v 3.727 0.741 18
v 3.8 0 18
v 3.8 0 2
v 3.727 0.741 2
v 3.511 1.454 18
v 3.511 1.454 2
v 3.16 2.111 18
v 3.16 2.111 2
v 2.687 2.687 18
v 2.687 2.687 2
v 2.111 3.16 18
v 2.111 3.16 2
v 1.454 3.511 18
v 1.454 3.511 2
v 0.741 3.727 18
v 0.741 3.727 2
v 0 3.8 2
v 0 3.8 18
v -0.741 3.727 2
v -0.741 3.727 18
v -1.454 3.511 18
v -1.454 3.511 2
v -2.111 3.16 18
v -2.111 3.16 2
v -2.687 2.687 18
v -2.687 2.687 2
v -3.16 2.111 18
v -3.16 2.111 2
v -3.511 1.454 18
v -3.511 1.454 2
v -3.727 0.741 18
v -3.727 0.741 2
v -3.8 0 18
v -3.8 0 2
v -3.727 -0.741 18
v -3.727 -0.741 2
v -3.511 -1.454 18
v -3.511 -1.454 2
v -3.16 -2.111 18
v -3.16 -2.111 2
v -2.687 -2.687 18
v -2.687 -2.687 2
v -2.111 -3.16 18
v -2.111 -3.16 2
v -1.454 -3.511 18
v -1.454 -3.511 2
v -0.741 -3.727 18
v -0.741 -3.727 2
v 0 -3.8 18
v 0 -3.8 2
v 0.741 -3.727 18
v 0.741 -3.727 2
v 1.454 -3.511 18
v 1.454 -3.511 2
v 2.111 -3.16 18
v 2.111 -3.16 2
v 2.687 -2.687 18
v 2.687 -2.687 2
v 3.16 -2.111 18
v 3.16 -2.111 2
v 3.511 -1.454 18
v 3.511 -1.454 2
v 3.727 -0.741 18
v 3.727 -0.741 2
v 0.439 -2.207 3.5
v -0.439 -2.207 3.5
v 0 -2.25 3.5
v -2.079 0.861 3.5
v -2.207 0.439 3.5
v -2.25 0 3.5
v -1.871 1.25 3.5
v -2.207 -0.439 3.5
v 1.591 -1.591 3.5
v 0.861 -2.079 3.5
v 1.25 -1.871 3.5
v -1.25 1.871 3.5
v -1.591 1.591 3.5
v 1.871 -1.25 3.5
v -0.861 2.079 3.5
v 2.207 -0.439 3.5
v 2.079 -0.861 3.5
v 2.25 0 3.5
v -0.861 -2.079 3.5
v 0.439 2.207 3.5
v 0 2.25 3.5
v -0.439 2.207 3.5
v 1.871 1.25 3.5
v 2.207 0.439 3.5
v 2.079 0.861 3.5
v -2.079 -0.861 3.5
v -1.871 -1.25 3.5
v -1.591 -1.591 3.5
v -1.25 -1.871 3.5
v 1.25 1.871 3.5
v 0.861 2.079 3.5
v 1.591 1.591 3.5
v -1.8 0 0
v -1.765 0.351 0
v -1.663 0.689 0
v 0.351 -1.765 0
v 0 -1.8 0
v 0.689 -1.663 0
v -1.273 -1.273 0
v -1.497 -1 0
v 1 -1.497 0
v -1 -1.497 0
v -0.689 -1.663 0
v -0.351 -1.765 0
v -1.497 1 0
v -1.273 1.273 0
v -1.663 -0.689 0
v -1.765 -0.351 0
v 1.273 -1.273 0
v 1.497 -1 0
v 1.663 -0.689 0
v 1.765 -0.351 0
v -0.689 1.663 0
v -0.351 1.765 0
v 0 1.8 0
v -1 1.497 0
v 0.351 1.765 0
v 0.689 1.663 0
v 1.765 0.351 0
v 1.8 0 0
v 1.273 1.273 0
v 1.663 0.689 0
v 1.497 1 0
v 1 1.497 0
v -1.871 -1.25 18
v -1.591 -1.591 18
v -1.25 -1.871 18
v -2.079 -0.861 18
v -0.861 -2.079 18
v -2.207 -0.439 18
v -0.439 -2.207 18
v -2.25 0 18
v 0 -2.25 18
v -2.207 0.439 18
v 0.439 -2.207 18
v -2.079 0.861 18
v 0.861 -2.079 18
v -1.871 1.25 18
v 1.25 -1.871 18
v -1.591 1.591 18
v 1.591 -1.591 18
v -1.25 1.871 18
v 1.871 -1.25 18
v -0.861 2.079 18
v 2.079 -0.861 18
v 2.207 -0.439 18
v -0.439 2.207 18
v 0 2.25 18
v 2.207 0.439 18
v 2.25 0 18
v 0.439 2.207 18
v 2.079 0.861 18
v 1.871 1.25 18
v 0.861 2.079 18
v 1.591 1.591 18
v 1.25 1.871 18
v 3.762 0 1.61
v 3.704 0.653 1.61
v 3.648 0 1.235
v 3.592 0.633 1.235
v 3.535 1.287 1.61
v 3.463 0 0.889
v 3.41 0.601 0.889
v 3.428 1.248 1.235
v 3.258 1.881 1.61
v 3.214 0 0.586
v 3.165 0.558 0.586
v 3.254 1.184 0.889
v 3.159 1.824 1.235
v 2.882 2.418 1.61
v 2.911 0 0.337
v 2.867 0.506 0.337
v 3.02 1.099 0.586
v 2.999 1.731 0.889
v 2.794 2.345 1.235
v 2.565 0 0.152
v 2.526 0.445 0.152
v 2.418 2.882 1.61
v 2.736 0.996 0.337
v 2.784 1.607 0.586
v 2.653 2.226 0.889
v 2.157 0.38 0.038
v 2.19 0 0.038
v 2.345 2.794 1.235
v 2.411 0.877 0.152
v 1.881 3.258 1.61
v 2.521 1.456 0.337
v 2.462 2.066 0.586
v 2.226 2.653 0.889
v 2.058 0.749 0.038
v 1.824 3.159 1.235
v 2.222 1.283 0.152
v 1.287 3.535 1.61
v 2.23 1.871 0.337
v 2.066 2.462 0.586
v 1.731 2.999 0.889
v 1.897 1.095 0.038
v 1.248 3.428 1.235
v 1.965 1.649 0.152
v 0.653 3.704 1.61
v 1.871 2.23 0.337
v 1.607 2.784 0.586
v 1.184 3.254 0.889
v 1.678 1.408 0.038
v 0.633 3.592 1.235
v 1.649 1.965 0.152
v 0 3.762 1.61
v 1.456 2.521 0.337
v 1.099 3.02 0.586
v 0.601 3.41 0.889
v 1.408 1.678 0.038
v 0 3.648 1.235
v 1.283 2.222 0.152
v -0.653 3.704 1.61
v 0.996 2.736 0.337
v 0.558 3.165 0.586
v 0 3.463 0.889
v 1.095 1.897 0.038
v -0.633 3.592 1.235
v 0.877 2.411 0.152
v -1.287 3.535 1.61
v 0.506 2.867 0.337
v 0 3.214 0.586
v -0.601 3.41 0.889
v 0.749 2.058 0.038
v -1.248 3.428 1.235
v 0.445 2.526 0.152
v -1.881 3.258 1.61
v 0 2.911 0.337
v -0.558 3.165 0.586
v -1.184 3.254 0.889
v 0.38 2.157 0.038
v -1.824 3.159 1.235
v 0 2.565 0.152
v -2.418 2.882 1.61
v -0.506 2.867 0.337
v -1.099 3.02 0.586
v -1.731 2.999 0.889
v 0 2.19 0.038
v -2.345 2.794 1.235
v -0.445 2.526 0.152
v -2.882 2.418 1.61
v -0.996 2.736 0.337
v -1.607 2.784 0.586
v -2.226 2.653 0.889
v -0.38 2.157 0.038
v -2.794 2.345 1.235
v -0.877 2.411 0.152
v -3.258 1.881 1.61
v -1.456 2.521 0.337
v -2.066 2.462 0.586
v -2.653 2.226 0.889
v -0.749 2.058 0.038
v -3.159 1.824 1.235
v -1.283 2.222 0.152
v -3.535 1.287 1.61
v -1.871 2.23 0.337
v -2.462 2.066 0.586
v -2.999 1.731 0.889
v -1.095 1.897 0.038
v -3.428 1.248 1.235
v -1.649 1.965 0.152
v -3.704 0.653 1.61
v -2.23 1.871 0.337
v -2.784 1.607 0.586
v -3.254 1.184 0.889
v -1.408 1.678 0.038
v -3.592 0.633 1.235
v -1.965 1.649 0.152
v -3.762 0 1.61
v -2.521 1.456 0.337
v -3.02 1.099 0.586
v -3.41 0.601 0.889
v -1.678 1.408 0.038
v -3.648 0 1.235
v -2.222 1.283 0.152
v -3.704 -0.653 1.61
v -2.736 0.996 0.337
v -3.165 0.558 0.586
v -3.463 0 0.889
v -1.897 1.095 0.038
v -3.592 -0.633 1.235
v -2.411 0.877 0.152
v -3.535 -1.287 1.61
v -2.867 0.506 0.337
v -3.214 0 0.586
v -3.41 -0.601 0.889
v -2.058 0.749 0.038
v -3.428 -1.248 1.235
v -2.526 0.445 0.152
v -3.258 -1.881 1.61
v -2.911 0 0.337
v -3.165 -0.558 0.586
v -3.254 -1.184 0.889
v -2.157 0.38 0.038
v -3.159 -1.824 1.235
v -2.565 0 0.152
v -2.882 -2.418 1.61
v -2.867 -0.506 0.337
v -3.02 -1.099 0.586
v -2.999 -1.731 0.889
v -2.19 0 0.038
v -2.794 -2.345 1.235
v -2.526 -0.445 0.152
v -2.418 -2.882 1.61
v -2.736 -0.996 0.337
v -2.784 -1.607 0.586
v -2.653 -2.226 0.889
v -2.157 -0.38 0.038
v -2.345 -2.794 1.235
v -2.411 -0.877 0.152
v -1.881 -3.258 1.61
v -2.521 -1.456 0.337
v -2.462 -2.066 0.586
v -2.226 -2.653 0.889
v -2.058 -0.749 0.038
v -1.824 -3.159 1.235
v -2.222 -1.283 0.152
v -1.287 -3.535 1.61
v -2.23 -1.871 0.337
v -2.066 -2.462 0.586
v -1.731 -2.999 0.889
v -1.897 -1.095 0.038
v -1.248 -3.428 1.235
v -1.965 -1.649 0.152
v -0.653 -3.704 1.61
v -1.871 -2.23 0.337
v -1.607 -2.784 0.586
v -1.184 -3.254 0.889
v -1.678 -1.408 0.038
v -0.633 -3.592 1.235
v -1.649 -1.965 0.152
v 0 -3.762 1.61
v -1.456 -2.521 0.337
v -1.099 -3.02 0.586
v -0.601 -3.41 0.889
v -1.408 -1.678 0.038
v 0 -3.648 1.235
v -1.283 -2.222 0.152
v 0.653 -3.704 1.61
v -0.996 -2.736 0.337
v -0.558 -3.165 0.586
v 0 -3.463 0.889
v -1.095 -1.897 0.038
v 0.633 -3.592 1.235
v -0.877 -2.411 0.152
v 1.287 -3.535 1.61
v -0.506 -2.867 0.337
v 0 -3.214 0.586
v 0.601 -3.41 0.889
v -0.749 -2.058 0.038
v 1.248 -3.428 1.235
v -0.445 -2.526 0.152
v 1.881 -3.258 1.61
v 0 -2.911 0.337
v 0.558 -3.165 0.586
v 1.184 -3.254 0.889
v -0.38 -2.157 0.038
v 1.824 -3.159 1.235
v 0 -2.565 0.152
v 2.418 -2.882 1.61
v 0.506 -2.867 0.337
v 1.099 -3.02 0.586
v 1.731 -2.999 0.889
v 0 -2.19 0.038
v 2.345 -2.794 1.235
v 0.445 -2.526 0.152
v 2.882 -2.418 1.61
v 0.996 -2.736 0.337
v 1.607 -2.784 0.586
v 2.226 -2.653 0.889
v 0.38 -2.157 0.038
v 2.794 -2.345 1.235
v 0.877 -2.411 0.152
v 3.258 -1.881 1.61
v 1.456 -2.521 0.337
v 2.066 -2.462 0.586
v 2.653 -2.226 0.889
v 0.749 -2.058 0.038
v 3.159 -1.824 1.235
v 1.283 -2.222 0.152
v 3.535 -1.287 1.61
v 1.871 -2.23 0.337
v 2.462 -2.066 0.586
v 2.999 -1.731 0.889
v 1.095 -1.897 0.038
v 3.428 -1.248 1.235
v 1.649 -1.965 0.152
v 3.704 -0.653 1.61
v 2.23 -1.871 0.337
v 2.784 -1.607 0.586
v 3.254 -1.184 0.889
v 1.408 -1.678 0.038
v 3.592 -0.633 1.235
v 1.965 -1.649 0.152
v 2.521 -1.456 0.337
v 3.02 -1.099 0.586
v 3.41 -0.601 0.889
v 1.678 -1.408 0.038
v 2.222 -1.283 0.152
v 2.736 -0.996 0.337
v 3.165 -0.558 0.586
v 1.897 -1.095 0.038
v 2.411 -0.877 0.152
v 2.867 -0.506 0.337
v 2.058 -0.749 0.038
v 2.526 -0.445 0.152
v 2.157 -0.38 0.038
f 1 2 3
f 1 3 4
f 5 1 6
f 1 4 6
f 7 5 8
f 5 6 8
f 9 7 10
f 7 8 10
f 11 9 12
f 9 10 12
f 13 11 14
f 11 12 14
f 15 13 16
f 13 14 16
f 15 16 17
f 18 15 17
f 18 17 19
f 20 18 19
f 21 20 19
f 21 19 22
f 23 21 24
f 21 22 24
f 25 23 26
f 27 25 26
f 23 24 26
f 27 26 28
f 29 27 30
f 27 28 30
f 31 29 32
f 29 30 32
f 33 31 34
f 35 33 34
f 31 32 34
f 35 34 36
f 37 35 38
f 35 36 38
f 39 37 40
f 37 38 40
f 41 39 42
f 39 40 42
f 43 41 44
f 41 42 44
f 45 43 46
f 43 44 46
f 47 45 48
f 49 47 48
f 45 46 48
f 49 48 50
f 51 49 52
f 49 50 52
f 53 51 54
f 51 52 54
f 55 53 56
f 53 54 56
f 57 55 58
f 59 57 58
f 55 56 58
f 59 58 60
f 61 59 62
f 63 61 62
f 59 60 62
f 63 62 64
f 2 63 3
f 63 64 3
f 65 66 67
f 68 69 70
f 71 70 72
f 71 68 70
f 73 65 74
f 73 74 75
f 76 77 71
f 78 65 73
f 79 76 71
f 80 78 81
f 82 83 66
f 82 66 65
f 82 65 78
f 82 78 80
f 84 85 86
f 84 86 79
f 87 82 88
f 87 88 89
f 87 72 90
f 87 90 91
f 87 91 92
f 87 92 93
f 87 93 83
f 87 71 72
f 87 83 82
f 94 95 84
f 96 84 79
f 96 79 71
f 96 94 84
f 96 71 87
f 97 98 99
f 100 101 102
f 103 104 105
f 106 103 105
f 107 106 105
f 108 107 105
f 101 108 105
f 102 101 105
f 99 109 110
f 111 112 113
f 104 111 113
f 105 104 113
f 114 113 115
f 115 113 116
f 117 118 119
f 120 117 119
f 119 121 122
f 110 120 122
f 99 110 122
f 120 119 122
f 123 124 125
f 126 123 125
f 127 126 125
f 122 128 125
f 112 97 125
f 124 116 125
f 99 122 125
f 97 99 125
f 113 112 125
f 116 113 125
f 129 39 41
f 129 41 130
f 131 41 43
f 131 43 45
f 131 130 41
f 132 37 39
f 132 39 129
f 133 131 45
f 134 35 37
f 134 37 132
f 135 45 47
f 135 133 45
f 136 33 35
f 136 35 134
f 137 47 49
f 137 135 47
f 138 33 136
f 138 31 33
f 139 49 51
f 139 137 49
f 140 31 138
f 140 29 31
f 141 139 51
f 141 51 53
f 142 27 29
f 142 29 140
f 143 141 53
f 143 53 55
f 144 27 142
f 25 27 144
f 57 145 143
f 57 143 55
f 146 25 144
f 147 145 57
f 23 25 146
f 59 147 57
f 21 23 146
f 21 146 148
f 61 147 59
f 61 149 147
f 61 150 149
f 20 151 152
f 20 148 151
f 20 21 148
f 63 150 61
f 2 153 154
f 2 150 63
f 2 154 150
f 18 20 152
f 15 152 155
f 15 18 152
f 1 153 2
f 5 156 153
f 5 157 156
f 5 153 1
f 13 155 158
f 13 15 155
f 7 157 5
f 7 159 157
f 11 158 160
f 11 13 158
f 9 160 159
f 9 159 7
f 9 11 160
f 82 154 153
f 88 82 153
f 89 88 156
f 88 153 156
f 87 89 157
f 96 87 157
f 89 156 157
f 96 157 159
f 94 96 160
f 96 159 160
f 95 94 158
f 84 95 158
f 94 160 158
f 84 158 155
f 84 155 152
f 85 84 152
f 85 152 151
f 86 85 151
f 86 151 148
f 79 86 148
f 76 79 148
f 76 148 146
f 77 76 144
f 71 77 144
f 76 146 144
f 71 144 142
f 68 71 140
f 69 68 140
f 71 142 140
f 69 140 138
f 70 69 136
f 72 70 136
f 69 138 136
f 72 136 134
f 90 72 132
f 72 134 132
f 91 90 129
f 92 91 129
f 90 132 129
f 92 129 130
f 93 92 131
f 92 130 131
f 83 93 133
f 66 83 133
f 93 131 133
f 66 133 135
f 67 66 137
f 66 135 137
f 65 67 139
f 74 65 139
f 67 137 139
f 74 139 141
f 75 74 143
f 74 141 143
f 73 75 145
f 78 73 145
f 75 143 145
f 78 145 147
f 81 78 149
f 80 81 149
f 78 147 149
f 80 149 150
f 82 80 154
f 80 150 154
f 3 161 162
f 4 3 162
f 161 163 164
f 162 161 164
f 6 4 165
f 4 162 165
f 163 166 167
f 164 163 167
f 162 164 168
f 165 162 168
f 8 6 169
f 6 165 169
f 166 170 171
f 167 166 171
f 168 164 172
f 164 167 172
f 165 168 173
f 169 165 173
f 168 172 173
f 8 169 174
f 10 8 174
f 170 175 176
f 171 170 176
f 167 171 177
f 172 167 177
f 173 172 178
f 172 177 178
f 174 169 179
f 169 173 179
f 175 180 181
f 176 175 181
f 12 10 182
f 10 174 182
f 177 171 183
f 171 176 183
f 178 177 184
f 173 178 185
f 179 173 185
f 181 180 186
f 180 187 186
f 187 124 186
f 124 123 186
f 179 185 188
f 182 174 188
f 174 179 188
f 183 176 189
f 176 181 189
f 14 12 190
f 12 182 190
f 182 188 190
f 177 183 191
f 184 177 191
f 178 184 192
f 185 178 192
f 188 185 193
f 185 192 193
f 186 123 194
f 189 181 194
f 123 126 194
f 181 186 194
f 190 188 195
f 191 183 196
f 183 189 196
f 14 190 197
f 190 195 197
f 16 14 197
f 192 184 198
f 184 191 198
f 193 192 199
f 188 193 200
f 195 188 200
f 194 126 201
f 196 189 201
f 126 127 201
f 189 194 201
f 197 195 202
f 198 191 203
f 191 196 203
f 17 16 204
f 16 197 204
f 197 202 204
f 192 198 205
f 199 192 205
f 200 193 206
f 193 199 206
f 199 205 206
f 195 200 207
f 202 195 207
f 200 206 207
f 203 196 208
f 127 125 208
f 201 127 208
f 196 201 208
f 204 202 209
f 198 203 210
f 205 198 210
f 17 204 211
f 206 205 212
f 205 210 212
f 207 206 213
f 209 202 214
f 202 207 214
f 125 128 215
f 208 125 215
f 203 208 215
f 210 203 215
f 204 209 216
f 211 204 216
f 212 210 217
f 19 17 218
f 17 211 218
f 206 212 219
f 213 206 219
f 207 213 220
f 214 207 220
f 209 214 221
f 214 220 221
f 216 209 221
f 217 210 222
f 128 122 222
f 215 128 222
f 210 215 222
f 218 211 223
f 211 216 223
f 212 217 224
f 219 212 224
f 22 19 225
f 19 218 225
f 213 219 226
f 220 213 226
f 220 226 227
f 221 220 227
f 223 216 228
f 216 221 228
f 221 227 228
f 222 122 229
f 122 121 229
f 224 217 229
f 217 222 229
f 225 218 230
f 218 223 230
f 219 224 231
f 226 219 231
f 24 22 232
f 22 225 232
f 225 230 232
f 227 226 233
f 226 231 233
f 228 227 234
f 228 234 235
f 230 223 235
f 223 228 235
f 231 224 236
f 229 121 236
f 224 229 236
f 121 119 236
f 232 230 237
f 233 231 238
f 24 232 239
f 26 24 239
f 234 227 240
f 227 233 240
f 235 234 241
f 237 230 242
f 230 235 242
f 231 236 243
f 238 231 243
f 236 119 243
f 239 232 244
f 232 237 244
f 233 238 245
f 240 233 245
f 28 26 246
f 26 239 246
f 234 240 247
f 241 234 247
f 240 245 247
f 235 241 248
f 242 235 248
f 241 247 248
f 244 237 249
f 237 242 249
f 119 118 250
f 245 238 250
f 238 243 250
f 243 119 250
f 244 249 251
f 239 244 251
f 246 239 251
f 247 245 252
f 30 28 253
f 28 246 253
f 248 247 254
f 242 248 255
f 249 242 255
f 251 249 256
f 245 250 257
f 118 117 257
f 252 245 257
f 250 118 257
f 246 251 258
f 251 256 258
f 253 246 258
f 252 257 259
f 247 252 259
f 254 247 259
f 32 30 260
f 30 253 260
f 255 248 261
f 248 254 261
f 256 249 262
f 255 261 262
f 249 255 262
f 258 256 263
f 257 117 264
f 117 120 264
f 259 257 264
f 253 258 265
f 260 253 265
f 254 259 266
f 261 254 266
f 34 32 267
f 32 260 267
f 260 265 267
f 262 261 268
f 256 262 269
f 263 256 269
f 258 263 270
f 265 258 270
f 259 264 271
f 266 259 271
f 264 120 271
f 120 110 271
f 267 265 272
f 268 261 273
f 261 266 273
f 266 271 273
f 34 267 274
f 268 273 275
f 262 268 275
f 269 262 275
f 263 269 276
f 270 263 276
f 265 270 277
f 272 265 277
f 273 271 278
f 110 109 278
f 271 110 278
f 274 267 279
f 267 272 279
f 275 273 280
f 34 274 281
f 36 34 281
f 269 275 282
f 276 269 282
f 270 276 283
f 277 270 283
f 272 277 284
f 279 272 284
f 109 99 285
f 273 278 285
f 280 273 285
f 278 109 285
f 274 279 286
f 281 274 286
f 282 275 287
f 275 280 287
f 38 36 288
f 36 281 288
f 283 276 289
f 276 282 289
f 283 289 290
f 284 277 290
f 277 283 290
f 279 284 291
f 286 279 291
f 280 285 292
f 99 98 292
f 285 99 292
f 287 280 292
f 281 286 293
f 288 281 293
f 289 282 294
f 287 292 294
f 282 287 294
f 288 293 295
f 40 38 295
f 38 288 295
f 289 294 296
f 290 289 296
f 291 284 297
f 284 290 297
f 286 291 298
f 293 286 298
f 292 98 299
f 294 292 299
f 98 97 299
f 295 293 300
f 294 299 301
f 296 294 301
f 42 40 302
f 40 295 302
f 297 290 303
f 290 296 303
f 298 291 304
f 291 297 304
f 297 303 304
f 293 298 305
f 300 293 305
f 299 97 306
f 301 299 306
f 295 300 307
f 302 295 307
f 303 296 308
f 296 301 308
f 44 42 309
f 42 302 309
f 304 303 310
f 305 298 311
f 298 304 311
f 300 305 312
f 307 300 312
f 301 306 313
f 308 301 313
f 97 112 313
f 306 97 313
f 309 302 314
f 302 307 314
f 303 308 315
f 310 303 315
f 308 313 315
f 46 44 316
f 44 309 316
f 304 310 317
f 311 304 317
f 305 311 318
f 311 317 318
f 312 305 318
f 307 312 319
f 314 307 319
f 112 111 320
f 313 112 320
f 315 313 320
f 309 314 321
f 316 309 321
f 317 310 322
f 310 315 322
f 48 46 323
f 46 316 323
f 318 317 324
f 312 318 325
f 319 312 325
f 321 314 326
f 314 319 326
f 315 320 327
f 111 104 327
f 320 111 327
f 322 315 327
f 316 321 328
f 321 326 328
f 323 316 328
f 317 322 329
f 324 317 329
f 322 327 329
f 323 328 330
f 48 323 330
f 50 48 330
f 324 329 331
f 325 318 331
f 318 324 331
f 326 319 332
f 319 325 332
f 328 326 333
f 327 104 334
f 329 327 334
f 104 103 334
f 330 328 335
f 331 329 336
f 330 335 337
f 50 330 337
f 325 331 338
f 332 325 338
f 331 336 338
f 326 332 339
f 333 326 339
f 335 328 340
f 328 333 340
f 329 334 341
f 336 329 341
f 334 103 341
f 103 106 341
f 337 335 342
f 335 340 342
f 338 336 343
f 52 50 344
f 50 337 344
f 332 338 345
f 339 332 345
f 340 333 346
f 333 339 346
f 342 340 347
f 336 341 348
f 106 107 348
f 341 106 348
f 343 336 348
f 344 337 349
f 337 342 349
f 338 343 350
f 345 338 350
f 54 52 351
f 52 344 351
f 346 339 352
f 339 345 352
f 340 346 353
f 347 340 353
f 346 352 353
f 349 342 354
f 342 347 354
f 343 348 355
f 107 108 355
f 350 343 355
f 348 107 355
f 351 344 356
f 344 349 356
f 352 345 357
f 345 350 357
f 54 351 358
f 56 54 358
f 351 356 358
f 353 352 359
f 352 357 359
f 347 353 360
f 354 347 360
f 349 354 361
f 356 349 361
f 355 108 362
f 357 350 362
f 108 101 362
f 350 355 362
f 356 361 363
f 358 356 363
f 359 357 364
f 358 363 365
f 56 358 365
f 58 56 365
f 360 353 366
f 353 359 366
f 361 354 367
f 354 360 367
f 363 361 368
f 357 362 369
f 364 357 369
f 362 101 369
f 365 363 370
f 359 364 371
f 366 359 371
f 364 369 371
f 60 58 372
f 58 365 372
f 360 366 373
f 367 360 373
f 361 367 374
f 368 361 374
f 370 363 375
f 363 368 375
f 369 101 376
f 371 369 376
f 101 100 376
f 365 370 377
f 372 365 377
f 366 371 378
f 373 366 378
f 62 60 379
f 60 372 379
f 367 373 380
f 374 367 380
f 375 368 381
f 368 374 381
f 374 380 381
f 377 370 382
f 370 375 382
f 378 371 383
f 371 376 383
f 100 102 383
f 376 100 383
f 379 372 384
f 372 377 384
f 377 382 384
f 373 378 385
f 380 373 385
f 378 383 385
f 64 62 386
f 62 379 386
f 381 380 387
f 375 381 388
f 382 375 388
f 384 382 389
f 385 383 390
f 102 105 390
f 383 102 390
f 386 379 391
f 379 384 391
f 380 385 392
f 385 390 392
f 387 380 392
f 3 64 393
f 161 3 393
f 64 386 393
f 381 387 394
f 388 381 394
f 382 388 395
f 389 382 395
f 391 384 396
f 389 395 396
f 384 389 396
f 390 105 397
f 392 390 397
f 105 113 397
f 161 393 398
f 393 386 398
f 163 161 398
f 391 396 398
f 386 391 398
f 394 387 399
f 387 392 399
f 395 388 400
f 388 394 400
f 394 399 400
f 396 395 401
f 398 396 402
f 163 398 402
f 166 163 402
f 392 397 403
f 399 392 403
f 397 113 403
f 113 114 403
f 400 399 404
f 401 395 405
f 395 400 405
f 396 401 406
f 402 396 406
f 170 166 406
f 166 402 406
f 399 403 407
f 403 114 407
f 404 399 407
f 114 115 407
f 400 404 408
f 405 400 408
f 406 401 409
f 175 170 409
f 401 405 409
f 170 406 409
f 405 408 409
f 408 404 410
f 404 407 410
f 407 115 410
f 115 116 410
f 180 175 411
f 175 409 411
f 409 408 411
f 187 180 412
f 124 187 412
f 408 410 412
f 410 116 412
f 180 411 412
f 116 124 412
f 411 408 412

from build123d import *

# Parameters (mm, degrees)
SKETCH_R     = 3.8
PAD_DEPTH    = 18
SKETCH001_R  = 2.25
POCKET_DEPTH = 14.5
FILLET_R     = 2


with BuildPart() as part:
    # Sketch → Pad (new body)
    with BuildSketch(Plane.XY):
        Circle(SKETCH_R)
    extrude(amount=PAD_DEPTH)

    # Sketch001 (on Face3 of Pad) → Pocket (cut)
    with BuildSketch(Plane.XY.offset(18)):
        Circle(SKETCH001_R)
    extrude(amount=-POCKET_DEPTH, mode=Mode.SUBTRACT)

    # Fillet
    fillet_edges = [part.edges().sort_by_distance(p)[0] for p in [
        (-3.8, 0, 0),
    ]]
    fillet(fillet_edges, radius=FILLET_R)


solid = part.part
